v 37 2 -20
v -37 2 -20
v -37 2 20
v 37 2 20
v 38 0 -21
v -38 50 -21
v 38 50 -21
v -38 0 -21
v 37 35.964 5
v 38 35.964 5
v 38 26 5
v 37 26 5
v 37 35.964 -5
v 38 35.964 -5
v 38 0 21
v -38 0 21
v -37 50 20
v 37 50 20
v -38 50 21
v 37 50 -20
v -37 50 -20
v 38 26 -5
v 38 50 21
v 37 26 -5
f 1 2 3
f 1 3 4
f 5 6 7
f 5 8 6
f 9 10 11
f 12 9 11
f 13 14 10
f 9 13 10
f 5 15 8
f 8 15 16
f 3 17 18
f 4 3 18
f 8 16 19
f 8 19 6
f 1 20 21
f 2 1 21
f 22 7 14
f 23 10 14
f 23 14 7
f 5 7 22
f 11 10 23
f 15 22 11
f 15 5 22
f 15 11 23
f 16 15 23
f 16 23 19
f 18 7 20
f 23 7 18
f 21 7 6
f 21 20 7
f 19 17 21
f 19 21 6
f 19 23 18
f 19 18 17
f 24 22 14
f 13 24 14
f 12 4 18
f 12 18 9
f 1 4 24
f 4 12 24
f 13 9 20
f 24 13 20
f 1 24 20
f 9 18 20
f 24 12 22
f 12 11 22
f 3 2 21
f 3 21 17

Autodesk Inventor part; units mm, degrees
ref_plane "YZ Plane" through (0, 0, 0) normal (1, 0, 0) x (0, 1, 0)
ref_plane "XZ Plane" through (0, 0, 0) normal (0, 1, 0) x (-1, 0, 0)
ref_plane "XY Plane" through (0, 0, 0) normal (0, 0, 1) x (1, 0, 0)
sketch "Sketch1" plane through (0, 0, 0) normal (0, 1, 0) x (-1, 0, 0)
  line L0 (-38, 21) -> (38, 21)
  line L1 (38, 21) -> (38, -21)
  line L2 (38, -21) -> (-38, -21)
  line L3 (-38, -21) -> (-38, 21)
  line L4 (-38, 21) -> (38, -21) construction
  line L5 (38, 21) -> (-38, -21) construction
  point P0 (0, 0)
  dimension "d0" = 42
  dimension "d1" = 76
extrude "Extrusion1" add sketch "Sketch1" along normal blind 50
sketch "Sketch2" plane through (0, 50, 0) normal (0, 1, 0) x (1, 0, 0)
  point P0 (0, 0)
sketch "Sketch3" plane through (0, 50, 0) normal (0, 1, 0) x (1, 0, 0)
  line L0 (-37, -20) -> (37, -20)
  line L1 (37, -20) -> (37, 20)
  line L2 (37, 20) -> (-37, 20)
  line L3 (-37, 20) -> (-37, -20)
  line L4 (-37, -20) -> (37, 20) construction
  line L5 (37, -20) -> (-37, 20) construction
  point P0 (0, 0)
  dimension "d4" = 40
  dimension "d5" = 74
extrude "Extrusion2" cut sketch "Sketch3" against normal blind 48
sketch "Sketch4" plane through (38, 0, 21) normal (1, 0, 0) x (0, 0, -1)
  line L0 (26, 74) -> (16, 74)
  line L1 (16, 74) -> (16, 26)
  line L2 (16, 26) -> (26, 26)
  line L3 (26, 26) -> (26, 74)
  line L4 (0, 50) -> (42, 50) projected
  line L5 (26, 74) -> (16, 26) construction
  line L6 (16, 74) -> (26, 26) construction
  line L7 (16, 26) -> (26, 26)
  line L8 (26, 26) -> (26, 35.9645)
  line L9 (26, 35.9645) -> (16, 35.9645)
  line L10 (16, 35.9645) -> (16, 26)
  point P0 (21, 0)
  point P1 (21, 50)
  dimension "d8" = 10
  dimension "d9" = 48
  dimension "d10" = 10
extrude "Extrusion3" cut sketch "Sketch4" against normal blind 20 contours L3 L2 L1 L9
properties part number "mcu_place"
